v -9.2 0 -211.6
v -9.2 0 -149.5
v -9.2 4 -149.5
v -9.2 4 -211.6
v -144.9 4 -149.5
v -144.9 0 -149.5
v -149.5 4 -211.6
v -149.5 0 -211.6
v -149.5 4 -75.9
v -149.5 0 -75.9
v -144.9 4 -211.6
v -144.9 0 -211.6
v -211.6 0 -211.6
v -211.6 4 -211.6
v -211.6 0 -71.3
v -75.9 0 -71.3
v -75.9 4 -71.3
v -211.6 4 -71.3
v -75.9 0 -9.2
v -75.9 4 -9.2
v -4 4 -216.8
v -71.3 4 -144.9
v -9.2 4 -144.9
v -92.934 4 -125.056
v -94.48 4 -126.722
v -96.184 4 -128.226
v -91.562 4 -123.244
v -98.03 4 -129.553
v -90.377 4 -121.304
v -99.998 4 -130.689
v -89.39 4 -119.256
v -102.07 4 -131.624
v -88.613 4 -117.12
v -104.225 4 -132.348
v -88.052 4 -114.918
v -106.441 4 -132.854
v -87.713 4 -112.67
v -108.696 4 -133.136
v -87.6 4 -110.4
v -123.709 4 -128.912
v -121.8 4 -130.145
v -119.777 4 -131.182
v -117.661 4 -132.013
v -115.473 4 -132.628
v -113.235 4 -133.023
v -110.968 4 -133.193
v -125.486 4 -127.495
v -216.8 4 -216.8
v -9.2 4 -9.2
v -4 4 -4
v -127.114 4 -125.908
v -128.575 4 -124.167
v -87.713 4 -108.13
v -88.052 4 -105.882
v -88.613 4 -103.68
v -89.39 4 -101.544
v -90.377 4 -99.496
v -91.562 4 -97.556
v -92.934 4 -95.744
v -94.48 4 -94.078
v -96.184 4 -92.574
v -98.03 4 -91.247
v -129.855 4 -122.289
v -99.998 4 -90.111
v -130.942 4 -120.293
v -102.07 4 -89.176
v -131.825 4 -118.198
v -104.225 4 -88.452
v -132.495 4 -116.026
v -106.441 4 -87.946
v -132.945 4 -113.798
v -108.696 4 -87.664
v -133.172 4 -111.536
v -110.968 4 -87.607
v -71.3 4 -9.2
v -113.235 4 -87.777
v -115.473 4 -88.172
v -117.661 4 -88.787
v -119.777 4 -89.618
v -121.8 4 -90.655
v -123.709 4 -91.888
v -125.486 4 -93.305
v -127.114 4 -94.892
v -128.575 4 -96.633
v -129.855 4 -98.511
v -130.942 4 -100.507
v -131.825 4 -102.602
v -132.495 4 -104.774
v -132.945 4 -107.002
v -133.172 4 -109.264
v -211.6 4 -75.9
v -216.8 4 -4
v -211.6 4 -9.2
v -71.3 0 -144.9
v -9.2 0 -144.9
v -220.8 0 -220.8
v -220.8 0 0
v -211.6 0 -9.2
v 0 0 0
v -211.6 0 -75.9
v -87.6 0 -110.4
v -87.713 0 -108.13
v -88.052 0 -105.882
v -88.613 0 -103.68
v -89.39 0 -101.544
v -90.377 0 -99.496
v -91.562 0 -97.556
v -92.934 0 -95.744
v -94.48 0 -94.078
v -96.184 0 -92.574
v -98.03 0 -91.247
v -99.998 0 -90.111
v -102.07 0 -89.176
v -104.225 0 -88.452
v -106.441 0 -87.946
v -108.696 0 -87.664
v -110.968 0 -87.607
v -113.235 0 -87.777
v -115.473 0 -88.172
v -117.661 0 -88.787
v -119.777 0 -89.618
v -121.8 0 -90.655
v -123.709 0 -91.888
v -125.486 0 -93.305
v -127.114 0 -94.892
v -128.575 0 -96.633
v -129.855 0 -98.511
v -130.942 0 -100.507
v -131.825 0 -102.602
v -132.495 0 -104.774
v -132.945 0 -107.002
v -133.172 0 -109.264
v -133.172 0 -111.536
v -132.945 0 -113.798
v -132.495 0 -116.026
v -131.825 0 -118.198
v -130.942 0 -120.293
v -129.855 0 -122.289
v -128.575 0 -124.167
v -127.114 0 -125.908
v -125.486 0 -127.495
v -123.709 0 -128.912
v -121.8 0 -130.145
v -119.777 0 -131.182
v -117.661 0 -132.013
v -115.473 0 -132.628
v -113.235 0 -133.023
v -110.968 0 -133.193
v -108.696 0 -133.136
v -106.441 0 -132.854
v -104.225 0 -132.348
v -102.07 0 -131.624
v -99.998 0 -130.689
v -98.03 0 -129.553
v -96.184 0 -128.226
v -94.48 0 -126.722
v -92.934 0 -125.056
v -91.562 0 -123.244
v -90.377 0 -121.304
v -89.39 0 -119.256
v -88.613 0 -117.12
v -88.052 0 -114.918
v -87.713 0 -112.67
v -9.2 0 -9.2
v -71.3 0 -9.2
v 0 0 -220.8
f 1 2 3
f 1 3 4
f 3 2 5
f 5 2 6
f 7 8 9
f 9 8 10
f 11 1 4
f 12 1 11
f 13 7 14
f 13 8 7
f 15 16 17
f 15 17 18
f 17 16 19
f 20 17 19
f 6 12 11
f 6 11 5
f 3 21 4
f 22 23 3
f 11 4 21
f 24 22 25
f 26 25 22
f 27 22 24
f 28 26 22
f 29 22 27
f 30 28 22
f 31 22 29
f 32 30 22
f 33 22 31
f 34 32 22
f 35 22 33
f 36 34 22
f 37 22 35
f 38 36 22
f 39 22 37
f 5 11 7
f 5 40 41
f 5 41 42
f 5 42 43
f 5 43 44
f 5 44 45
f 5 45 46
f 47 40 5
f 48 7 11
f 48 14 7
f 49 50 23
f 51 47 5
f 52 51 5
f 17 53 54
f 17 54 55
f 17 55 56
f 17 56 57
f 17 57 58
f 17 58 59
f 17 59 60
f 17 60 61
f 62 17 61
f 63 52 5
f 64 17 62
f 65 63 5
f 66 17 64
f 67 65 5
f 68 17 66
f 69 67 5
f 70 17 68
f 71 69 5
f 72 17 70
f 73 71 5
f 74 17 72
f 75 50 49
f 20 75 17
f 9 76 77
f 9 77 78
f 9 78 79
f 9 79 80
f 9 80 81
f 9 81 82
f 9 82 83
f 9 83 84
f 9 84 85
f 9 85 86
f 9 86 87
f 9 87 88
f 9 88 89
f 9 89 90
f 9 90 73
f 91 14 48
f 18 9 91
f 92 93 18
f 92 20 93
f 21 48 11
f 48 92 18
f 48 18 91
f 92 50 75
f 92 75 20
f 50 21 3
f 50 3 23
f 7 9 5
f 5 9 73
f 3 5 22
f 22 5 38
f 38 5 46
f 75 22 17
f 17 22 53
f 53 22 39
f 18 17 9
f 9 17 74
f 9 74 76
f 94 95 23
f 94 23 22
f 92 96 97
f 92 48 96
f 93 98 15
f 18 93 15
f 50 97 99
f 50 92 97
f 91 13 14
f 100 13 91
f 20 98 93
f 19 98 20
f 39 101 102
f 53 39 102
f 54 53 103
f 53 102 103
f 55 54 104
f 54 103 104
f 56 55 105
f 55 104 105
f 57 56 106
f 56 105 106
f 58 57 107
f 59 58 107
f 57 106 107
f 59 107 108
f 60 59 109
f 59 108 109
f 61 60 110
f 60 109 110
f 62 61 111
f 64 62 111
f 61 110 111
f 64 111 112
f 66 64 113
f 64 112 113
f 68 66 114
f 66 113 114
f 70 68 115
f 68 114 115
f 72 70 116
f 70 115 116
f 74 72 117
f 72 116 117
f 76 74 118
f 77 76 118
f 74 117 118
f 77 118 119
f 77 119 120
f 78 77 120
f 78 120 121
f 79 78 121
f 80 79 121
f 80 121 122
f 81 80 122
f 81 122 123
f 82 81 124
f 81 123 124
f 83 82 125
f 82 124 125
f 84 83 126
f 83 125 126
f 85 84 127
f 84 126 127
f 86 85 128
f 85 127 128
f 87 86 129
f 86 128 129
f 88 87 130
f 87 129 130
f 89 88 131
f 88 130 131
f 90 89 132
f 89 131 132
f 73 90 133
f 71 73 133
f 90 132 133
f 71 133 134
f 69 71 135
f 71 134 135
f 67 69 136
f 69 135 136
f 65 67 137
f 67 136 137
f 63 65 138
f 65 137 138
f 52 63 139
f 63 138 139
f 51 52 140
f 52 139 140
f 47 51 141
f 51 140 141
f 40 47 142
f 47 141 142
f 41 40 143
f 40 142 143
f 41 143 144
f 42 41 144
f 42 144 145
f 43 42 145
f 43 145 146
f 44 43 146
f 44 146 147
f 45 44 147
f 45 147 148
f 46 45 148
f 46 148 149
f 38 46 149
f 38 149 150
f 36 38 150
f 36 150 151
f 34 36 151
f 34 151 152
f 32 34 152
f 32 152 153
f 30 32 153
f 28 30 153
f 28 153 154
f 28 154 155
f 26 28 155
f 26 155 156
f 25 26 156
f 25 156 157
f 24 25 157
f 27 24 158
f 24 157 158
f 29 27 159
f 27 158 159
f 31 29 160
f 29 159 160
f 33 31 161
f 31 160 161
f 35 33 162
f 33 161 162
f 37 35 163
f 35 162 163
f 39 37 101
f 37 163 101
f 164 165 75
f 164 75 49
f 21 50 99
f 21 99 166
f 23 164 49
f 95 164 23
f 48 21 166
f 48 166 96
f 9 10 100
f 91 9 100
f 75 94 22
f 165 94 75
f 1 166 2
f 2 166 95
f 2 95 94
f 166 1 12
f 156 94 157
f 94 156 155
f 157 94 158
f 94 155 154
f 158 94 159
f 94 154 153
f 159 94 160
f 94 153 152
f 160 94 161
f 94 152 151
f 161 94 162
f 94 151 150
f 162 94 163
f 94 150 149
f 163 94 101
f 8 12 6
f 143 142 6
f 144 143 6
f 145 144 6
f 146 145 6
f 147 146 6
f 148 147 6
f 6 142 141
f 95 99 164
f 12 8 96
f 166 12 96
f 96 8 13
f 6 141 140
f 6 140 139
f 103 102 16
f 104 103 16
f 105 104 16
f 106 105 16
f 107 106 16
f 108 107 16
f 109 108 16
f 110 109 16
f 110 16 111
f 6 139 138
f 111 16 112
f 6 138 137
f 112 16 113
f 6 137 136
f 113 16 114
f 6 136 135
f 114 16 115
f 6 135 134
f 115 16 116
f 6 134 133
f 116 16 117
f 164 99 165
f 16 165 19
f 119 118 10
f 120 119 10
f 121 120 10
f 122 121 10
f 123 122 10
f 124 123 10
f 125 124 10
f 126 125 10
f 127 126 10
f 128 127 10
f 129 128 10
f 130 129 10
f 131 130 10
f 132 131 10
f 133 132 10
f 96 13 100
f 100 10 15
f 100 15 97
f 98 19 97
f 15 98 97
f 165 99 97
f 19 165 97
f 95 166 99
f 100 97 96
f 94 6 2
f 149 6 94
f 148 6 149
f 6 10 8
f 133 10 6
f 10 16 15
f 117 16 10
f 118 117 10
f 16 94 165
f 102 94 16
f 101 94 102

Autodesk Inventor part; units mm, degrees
ref_plane "YZ Plane" through (0, 0, 0) normal (1, 0, 0) x (0, 1, 0)
ref_plane "XZ Plane" through (0, 0, 0) normal (0, 1, 0) x (-1, 0, 0)
ref_plane "XY Plane" through (0, 0, 0) normal (0, 0, 1) x (1, 0, 0)
sketch "Boceto1" plane through (0, 0, 0) normal (0, 1, 0) x (-1, 0, 0)
  line L0 (0, 0) -> (220.8, 0)
  line L1 (220.8, 0) -> (220.8, -220.8)
  line L2 (220.8, -220.8) -> (0, -220.8)
  line L3 (0, -220.8) -> (0, 0)
  line L4 (211.6, -211.6) -> (211.6, -147.2)
  line L5 (211.6, -9.2) -> (156.4, -9.2)
  line L6 (9.2, -211.6) -> (73.6, -211.6)
  line L7 (73.6, -211.6) -> (73.6, -209.3)
  line L8 (75.9, -71.3) -> (211.6, -71.3)
  line L9 (149.5, -211.6) -> (149.5, -75.9)
  line L10 (211.6, -9.2) -> (211.6, -71.3)
  line L11 (211.6, -75.9) -> (211.6, -82.8)
  line L12 (211.6, -211.6) -> (211.6, -75.9)
  line L13 (211.6, -71.3) -> (211.6, -9.2)
  line L14 (75.9, -75.9) -> (144.9, -75.9)
  line L15 (149.5, -75.9) -> (211.6, -75.9)
  line L16 (9.2, -149.5) -> (144.9, -149.5)
  line L17 (144.9, -211.6) -> (144.9, -149.5)
  line L18 (144.9, -144.9) -> (144.9, -75.9)
  line L19 (71.3, -144.9) -> (71.3, -9.2)
  line L20 (9.2, -144.9) -> (71.3, -144.9)
  line L21 (75.9, -144.9) -> (144.9, -144.9)
  line L22 (75.9, -144.9) -> (75.9, -75.9)
  line L23 (75.9, -71.3) -> (75.9, -9.2)
  line L24 (211.6, -9.2) -> (75.9, -9.2)
  line L25 (71.3, -9.2) -> (9.2, -9.2)
  line L26 (9.2, -9.2) -> (9.2, -144.9)
  line L27 (9.2, -149.5) -> (9.2, -211.6)
  line L28 (9.2, -211.6) -> (144.9, -211.6)
  line L29 (149.5, -211.6) -> (211.6, -211.6)
  dimension "d0" = 220.8
  dimension "d1" = 220.8
extrude "Extrusión1" add sketch "Boceto1" along normal blind 4
chamfer "Chaflán1" distance 4 angle 45 4 edges at (-220.8, 4, -110.4) (-110.4, 4, 0) (0, 4, -110.4) (-110.4, 4, -220.8) measured on face at (-121.9, 4, -217.7333)
sketch "Boceto2" plane through (0, 0, 0) normal (0, -1, 0) x (1, 0, 0)
  line L0 (-216.8, -4) -> (-216.8, -216.8) projected
  line L1 (0, -220.8) -> (-220.8, -220.8) projected
  line L2 (0, 0) -> (0, -220.8) projected
  line L3 (-220.8, 0) -> (0, 0) projected
  line L4 (-220.8, -220.8) -> (-220.8, 0) projected
  line L5 (-9.2, -211.6) -> (-9.2, -149.5) projected
  line L6 (-144.9, -211.6) -> (-9.2, -211.6) projected
  line L7 (-144.9, -149.5) -> (-144.9, -211.6) projected
  line L8 (-9.2, -149.5) -> (-144.9, -149.5) projected
  line L9 (-71.3, -144.9) -> (-9.2, -144.9) projected
  line L10 (-71.3, -9.2) -> (-71.3, -144.9) projected
  line L11 (-9.2, -9.2) -> (-71.3, -9.2) projected
  line L12 (-9.2, -144.9) -> (-9.2, -9.2) projected
  line L13 (-75.9, -144.9) -> (-75.9, -75.9) projected
  line L14 (-144.9, -144.9) -> (-75.9, -144.9) projected
  line L15 (-144.9, -75.9) -> (-144.9, -144.9) projected
  line L16 (-75.9, -75.9) -> (-144.9, -75.9) projected
  line L17 (-149.5, -75.9) -> (-211.6, -75.9) projected
  line L18 (-149.5, -211.6) -> (-149.5, -75.9) projected
  line L19 (-211.6, -211.6) -> (-149.5, -211.6) projected
  line L20 (-211.6, -75.9) -> (-211.6, -211.6) projected
  line L21 (-75.9, -71.3) -> (-75.9, -9.2) projected
  line L22 (-211.6, -71.3) -> (-75.9, -71.3) projected
  line L23 (-211.6, -9.2) -> (-211.6, -71.3) projected
  line L24 (-75.9, -9.2) -> (-211.6, -9.2) projected
  circle A0 centre (-110.4, -110.4) radius 34.5
  circle A1 centre (-110.4, -110.4) radius 22.8
  dimension "d31" = 45.6
extrude "Extrusión2" add sketch "Boceto2" against normal blind 4 contours L14 A0 L13 | A0 L16 L13 | A0 | L14 L15 A0 | A0 L15 L16
properties part number "Lampara2base"
